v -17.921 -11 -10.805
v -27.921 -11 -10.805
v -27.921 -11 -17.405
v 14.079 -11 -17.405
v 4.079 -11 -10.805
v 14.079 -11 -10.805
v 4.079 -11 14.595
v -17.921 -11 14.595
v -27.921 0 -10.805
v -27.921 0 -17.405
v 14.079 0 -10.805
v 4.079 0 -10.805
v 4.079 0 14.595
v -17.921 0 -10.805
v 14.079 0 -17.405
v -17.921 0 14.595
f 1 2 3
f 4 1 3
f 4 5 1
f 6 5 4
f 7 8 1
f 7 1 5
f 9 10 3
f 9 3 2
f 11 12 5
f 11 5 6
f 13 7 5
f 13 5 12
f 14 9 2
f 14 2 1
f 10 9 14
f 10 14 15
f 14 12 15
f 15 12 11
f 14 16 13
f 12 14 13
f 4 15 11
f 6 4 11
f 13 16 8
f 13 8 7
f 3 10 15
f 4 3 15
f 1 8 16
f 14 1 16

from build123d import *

# Parameters (mm, degrees)
F0_W     = 42
F0_H     = 32
F1_DEPTH = 11
F2_W     = 10
F2_H     = 11
F3_DEPTH = 25.4
F4_DEPTH = 25.4
F7_DEPTH = 1.525342


with BuildPart() as f1:
    # F0 (on Front) → F1 (new body)
    with BuildSketch(Plane.XZ):
        with Locations((-6.920929, -1.405328)):
            Rectangle(F0_W, F0_H)
    extrude(amount=F1_DEPTH)

    # F2 (on face) → F3 (cut)
    with BuildSketch(Plane.XY.offset(14.594672)):
        with Locations((-22.920929, -5.5)):
            Rectangle(F2_W, F2_H)
    extrude(amount=-F3_DEPTH, mode=Mode.SUBTRACT)

    # F2 (on face) → F4 (cut)
    with BuildSketch(Plane.XY.offset(14.594672)):
        with Locations((9.079071, -5.5)):
            Rectangle(F2_W, F2_H)
    extrude(amount=-F4_DEPTH, mode=Mode.SUBTRACT)

    # F6 (on face) → F7 (join)
    with BuildSketch(Plane(origin=(0, 0, 0), x_dir=(-1, 0, 0), z_dir=(0, 1, 0))):
        with BuildLine():
            ThreePointArc((14.309347, 11.993863), (13.754616, 12.312149), (13.150224, 12.521295))
            ThreePointArc((13.150224, 12.521295), (12.905231, 11.705894), (13.101386, 10.877388))
            ThreePointArc((13.101386, 10.877388), (13.439924, 11.24292), (13.917749, 11.384008))
            ThreePointArc((13.917749, 11.384008), (14.074362, 11.714097), (14.309347, 11.993863))
        make_face()
    extrude(amount=-F7_DEPTH)


solid = f1.part
